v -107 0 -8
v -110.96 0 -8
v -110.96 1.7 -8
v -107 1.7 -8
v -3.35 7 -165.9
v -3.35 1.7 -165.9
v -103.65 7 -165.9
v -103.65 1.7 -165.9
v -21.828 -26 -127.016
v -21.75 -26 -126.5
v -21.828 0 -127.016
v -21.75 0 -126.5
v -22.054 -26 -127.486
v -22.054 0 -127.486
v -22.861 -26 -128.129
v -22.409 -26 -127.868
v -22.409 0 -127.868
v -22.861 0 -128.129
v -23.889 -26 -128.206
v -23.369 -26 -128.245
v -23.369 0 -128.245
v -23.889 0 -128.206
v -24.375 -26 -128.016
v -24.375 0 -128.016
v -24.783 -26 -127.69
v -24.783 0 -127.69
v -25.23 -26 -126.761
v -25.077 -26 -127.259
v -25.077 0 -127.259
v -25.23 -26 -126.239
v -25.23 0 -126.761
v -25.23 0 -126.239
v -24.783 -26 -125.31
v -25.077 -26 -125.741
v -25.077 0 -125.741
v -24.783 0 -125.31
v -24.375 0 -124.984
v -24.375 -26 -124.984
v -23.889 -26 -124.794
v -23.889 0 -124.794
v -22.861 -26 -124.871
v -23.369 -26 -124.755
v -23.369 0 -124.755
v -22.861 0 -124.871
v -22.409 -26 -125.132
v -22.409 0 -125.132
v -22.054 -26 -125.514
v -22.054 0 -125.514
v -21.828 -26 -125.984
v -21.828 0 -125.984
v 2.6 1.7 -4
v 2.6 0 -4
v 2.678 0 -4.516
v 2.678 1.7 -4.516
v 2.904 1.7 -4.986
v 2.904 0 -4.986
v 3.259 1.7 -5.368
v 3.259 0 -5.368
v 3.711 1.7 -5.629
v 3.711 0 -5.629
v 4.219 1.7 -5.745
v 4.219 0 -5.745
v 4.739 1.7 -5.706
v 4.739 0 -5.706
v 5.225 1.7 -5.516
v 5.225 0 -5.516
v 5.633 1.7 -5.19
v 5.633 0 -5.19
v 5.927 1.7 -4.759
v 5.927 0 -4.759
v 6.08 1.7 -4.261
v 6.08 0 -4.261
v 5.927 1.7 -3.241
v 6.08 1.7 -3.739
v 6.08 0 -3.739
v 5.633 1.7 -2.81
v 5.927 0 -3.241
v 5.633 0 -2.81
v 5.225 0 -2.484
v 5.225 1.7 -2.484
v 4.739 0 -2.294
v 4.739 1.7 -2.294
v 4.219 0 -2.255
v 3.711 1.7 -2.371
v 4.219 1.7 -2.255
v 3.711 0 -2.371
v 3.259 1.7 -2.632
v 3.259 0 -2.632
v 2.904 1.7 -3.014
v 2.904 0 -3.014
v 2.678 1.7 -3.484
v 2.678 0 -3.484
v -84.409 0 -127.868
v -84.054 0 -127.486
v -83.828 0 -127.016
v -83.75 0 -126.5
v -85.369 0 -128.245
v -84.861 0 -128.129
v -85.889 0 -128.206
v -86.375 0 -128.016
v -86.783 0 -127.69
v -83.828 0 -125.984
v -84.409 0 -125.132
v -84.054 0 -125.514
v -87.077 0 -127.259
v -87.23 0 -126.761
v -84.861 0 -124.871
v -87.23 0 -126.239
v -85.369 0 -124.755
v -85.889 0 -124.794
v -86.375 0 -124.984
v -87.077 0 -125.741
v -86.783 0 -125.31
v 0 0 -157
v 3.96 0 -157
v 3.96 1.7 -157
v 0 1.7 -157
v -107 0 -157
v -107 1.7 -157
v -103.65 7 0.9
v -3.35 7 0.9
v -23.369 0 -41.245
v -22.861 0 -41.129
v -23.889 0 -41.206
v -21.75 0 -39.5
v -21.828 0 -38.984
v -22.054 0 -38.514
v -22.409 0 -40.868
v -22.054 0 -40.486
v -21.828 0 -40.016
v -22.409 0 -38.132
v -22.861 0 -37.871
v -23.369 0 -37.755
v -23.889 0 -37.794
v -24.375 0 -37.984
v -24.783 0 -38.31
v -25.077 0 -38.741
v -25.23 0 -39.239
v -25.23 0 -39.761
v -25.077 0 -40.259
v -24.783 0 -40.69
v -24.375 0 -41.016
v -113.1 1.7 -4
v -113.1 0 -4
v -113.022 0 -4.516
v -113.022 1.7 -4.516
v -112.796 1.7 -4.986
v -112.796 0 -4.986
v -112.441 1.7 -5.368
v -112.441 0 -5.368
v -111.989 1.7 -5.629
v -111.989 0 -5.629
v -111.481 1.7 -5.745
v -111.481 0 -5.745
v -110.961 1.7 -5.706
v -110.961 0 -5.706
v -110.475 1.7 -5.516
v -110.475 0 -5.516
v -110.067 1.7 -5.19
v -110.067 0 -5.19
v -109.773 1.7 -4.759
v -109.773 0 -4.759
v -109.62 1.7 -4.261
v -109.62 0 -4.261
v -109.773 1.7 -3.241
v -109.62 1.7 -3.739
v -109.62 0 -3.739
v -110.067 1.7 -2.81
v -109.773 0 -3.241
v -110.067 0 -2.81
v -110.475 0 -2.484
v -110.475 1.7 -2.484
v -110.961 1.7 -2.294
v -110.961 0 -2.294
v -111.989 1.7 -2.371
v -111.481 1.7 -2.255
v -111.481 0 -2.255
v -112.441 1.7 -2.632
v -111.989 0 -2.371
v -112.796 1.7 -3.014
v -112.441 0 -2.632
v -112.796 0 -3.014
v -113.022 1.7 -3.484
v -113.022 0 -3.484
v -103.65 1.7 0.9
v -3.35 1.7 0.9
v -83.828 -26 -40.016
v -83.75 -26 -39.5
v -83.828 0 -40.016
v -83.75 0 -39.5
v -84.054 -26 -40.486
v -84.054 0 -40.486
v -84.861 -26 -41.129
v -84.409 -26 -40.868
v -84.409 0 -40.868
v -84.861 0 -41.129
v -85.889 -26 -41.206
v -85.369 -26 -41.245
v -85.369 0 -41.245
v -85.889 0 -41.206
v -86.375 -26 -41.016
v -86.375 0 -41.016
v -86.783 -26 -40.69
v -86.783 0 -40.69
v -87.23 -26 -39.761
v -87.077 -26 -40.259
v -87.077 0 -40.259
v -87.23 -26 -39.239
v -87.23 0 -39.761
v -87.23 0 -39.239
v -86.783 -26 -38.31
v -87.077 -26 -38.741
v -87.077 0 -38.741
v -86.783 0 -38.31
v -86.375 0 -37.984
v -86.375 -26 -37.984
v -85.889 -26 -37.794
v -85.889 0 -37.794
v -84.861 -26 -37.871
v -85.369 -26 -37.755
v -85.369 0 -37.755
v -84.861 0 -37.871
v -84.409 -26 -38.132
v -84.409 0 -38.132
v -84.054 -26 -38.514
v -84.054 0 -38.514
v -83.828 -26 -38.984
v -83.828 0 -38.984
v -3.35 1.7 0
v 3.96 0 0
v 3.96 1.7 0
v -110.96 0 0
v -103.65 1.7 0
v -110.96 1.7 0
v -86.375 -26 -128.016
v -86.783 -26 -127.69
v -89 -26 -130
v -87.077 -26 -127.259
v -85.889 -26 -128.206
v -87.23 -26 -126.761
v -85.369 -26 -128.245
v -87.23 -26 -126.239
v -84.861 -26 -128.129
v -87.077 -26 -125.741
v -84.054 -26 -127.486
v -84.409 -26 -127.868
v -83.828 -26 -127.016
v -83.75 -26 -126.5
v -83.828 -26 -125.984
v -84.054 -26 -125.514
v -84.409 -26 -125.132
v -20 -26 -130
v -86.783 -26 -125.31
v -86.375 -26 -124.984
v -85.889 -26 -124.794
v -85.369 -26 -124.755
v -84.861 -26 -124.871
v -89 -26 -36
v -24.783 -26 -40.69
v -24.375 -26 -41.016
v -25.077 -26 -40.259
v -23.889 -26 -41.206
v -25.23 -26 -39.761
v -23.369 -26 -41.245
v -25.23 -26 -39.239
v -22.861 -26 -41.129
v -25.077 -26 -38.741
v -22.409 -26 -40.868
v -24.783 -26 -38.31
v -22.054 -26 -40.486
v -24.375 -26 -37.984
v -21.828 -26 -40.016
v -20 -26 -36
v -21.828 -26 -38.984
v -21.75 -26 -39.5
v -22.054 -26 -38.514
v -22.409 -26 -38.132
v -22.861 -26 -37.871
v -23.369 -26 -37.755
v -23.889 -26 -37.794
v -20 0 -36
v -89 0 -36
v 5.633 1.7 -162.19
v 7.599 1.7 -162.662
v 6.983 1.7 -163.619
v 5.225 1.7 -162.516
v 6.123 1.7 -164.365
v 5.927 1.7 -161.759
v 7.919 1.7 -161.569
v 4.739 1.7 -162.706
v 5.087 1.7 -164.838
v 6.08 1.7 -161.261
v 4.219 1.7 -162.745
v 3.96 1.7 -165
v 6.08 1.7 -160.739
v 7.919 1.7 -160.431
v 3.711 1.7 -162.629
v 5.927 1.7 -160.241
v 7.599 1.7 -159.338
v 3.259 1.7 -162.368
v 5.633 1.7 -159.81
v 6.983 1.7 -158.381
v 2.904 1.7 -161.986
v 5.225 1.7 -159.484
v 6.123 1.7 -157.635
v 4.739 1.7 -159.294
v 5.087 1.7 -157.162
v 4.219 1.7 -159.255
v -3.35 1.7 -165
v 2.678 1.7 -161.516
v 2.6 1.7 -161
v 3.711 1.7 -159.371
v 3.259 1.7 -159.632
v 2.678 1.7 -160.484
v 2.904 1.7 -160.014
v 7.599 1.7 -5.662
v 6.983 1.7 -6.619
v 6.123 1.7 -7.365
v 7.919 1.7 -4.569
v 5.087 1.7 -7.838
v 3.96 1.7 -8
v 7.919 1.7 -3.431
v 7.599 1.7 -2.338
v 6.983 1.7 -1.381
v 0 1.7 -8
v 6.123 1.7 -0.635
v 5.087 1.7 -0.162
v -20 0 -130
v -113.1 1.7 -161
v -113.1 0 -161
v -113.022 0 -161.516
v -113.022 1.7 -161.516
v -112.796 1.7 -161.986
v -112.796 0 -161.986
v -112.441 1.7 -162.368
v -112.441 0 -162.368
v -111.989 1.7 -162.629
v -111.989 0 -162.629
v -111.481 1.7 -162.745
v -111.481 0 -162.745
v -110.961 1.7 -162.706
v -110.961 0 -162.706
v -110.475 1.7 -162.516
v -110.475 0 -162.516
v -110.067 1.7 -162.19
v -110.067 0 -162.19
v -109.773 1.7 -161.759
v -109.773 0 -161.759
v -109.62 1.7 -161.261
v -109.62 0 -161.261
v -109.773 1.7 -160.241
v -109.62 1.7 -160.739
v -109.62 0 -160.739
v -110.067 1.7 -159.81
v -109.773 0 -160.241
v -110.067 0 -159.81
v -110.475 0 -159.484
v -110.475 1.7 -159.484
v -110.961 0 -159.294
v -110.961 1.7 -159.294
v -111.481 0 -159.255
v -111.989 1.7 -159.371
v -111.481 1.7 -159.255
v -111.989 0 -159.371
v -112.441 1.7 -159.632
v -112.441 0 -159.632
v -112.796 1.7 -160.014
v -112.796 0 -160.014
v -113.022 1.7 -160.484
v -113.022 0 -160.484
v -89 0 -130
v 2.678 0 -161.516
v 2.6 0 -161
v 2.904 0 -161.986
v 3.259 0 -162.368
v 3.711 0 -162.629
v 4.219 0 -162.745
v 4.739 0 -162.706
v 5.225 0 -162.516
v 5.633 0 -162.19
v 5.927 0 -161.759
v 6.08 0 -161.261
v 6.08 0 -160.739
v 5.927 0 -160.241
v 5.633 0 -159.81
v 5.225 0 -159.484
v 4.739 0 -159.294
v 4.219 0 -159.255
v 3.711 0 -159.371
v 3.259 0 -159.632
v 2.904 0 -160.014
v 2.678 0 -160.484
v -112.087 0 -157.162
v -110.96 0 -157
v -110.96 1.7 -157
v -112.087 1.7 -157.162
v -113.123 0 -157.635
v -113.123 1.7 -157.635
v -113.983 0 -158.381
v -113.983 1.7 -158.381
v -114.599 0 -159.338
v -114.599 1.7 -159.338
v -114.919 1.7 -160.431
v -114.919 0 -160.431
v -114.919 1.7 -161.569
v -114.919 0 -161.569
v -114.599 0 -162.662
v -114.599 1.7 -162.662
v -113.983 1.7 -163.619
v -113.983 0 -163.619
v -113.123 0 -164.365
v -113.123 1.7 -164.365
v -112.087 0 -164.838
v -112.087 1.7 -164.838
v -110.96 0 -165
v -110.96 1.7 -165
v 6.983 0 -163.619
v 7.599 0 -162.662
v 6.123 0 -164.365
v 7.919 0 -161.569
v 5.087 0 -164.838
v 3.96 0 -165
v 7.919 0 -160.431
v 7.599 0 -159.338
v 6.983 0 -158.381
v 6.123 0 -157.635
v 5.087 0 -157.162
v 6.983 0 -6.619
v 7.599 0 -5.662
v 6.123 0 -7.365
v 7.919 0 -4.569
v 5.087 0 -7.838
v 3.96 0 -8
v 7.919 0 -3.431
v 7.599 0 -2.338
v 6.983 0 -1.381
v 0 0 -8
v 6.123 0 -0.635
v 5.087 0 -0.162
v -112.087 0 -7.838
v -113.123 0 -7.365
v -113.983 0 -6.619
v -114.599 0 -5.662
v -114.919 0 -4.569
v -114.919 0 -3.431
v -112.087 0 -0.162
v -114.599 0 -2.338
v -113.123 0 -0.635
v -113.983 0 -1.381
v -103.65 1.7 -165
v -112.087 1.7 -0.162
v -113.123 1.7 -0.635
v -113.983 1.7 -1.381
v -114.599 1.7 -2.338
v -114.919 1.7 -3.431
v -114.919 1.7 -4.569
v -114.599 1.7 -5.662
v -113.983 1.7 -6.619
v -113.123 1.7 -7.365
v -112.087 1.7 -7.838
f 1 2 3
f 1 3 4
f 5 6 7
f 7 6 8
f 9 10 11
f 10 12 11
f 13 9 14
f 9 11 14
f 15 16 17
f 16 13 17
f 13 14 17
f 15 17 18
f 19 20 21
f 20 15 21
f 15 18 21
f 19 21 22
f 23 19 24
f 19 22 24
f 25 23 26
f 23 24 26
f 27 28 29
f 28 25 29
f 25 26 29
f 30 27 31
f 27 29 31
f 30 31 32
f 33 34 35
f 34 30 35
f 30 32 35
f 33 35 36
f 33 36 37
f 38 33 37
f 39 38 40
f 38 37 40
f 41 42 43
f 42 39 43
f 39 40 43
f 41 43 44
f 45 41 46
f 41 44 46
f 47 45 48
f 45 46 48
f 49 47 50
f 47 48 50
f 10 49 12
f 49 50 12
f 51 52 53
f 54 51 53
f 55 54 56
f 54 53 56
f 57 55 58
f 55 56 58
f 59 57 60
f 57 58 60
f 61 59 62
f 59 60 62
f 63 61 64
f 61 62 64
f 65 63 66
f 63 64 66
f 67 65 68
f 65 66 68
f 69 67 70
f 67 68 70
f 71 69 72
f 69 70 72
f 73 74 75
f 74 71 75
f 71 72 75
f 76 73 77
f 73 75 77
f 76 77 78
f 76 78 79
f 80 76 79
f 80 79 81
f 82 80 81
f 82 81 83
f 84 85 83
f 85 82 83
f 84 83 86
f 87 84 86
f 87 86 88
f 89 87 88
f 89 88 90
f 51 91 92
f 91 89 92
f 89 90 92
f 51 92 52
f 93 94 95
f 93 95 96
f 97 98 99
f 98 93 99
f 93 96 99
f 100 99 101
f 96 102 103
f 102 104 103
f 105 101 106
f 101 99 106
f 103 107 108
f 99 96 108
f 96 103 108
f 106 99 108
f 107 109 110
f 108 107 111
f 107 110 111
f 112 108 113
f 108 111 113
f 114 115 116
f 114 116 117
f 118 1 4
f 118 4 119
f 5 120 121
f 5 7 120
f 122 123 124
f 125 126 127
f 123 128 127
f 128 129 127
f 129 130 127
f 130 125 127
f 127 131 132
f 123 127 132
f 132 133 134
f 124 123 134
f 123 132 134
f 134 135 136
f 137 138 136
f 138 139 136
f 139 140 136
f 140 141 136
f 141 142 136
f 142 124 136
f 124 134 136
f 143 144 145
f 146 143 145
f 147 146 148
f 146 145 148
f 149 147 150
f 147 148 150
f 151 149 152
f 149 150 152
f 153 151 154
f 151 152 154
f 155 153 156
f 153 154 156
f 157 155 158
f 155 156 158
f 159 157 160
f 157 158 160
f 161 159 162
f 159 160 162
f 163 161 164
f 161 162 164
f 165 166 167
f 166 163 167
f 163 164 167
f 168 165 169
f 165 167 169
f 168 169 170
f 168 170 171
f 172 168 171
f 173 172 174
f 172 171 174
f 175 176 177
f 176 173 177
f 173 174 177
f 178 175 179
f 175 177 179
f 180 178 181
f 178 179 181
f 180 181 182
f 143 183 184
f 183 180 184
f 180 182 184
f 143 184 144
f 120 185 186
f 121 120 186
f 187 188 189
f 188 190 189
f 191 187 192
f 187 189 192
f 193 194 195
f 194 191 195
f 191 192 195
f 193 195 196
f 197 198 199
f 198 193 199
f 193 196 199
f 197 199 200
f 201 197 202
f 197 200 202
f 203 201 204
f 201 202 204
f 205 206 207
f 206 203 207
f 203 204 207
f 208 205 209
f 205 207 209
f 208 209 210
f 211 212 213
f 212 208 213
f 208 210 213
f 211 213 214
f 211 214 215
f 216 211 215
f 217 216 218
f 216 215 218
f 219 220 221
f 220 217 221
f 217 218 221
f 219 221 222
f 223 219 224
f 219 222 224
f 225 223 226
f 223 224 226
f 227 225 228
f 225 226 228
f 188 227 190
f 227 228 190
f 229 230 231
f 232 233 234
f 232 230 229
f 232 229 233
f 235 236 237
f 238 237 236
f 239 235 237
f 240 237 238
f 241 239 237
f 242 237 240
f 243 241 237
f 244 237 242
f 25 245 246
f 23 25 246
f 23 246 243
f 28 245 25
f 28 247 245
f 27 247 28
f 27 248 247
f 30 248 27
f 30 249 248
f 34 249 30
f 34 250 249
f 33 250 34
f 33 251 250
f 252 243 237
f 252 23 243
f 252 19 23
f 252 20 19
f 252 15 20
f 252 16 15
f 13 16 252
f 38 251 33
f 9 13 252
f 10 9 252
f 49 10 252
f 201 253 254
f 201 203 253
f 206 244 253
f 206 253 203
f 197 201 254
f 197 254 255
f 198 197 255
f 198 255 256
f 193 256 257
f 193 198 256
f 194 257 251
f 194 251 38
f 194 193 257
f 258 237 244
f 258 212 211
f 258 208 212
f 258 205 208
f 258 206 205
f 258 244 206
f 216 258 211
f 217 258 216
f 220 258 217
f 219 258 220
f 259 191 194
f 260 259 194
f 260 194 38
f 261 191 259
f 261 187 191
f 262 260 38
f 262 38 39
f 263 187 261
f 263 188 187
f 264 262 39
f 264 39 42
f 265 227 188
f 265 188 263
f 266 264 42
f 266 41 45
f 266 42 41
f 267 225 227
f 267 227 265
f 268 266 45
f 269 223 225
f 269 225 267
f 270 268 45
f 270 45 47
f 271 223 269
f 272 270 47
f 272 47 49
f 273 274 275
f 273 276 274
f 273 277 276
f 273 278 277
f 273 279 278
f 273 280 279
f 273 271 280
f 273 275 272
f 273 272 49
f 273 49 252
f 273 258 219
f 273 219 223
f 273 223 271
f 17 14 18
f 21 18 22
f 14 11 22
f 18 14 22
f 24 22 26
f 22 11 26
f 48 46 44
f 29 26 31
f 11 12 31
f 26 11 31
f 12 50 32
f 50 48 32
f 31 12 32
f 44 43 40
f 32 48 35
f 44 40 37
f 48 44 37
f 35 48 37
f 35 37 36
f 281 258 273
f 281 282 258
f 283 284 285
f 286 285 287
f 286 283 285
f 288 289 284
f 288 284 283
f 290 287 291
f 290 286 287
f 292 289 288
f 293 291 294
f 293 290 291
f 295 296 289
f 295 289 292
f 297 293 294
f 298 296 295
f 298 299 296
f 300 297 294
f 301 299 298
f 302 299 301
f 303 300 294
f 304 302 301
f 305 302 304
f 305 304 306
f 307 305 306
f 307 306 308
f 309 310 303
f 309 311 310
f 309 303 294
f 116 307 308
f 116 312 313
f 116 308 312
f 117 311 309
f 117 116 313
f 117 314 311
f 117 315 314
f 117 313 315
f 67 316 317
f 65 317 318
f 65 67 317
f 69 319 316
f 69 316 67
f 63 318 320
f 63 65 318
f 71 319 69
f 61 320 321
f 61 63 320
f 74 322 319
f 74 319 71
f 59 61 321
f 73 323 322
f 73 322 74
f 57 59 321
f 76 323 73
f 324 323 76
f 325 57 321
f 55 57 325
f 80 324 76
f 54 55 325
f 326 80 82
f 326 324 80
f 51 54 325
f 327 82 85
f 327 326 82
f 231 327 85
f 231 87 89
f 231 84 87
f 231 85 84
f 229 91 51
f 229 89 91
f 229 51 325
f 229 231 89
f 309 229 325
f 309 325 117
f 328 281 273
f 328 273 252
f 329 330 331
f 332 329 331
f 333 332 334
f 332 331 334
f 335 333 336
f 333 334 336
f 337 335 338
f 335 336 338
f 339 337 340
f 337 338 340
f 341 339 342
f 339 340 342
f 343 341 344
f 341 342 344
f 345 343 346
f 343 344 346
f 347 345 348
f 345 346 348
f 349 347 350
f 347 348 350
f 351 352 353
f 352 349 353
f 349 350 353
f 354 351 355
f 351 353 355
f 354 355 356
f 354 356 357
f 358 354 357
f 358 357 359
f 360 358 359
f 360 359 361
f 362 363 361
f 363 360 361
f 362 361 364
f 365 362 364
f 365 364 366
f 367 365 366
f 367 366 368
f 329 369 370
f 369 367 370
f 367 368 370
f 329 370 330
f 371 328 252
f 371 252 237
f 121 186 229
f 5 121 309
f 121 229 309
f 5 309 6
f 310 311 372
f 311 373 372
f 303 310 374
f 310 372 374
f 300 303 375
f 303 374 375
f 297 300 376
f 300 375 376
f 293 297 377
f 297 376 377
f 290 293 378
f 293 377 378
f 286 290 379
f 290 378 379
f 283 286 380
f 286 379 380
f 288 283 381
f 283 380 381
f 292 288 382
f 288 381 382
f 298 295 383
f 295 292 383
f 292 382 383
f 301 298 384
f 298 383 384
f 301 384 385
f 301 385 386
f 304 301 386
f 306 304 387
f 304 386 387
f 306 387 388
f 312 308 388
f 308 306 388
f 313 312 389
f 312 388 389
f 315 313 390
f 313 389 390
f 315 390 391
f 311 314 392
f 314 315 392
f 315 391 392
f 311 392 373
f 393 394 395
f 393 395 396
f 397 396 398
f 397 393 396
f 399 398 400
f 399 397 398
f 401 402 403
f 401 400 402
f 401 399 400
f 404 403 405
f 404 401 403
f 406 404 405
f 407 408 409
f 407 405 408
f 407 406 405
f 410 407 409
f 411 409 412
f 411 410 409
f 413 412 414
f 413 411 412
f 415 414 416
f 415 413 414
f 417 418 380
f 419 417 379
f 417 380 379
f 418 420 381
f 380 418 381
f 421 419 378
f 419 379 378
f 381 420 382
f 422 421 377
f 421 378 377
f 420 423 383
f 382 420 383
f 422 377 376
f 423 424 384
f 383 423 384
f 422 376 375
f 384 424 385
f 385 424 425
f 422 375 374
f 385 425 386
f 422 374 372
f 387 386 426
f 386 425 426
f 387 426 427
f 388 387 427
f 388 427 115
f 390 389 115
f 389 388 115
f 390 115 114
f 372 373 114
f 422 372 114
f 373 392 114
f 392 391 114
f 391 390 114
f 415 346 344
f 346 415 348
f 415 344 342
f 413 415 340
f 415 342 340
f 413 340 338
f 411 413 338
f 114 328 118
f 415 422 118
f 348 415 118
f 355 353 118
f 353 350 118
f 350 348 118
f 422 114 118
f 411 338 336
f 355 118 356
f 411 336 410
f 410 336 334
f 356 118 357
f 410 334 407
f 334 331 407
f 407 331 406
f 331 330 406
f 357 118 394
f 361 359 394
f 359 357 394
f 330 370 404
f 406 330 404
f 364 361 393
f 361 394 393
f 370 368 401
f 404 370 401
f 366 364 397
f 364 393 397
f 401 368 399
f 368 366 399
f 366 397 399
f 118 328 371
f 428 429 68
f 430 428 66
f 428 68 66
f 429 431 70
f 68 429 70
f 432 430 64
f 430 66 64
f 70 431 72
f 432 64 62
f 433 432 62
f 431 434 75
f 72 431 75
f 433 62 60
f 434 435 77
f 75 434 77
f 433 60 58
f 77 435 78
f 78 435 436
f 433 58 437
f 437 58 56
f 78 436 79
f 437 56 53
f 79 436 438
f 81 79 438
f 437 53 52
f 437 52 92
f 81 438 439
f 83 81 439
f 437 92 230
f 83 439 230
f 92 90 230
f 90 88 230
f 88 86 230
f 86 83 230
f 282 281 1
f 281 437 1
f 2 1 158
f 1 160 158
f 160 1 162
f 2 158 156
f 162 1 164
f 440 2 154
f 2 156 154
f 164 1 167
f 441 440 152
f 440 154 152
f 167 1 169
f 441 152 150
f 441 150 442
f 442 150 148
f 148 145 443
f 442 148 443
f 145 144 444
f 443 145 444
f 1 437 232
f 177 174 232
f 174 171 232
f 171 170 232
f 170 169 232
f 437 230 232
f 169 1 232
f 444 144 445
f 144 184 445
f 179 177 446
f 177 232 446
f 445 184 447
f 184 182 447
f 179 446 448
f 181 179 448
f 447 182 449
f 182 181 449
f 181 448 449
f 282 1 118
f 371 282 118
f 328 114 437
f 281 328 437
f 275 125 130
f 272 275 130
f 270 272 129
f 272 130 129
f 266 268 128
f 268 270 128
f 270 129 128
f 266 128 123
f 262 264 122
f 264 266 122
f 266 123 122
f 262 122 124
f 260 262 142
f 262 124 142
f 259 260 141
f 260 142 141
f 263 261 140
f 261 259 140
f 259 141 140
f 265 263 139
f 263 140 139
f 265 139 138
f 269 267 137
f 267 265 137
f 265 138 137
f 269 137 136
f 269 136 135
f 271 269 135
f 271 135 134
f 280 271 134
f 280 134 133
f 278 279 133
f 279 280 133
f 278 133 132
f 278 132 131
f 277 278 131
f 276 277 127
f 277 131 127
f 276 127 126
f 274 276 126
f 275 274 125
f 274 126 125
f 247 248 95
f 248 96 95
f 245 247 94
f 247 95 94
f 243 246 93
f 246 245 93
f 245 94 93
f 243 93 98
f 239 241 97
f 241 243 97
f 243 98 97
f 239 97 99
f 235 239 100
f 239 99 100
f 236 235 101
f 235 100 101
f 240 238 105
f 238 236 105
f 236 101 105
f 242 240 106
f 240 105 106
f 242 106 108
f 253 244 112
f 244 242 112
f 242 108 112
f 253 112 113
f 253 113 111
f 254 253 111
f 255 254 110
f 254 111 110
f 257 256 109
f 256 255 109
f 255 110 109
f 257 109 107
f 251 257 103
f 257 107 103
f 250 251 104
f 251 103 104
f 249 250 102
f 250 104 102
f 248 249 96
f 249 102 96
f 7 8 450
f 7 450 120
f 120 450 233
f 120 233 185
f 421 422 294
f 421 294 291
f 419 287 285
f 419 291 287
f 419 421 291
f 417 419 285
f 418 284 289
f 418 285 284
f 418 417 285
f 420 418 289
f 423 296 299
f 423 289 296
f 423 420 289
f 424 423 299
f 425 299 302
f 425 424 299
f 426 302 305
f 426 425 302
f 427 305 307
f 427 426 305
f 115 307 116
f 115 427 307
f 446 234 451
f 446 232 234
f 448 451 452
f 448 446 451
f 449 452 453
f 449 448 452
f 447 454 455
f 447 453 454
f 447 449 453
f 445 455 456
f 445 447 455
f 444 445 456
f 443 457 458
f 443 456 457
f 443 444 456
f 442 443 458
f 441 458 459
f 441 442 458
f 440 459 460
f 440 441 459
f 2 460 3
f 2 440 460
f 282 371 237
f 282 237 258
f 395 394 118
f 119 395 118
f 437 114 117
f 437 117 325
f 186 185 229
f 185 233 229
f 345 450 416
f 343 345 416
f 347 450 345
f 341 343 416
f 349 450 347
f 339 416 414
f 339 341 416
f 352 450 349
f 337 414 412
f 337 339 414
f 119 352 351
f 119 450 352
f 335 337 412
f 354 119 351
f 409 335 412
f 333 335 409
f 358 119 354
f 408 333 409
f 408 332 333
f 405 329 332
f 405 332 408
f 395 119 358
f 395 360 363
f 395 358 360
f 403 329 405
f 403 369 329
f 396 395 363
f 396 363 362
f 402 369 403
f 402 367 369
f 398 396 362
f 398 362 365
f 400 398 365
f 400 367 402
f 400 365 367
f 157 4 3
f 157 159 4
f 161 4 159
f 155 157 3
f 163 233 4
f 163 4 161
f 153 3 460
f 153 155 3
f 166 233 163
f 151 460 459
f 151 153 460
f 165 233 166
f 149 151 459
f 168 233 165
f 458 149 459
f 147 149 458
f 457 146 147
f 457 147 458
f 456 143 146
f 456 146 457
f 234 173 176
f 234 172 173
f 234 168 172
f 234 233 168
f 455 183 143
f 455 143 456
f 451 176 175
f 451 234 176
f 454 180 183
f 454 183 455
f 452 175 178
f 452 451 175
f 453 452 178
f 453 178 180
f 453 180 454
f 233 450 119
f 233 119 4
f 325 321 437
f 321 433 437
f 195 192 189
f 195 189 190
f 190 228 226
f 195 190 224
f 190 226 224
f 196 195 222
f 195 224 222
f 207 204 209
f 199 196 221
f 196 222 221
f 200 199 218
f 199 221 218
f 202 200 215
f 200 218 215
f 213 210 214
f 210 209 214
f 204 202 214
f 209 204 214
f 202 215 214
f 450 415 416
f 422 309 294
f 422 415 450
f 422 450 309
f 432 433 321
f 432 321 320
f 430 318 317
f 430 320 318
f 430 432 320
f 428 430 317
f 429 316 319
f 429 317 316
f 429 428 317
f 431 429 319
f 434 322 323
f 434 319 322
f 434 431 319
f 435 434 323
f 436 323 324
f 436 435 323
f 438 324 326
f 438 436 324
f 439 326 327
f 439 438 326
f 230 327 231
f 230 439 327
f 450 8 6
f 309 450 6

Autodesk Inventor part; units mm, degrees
ref_plane "YZ Plane" through (0, 0, 0) normal (1, 0, 0) x (0, 1, 0)
ref_plane "XZ Plane" through (0, 0, 0) normal (0, 1, 0) x (-1, 0, 0)
ref_plane "XY Plane" through (0, 0, 0) normal (0, 0, 1) x (1, 0, 0)
sketch "スケッチ1" plane through (0, 0, 0) normal (0, 1, 0) x (-1, 0, 0)
  line L0 (0, 0) -> (107, 0)
  line L1 (107, 0) -> (107, -165)
  line L2 (107, -165) -> (0, -165)
  line L3 (0, -165) -> (0, 0)
  line L4 (107, 0) -> (114.96, 0)
  line L5 (114.96, 0) -> (114.96, -8)
  line L6 (114.96, -8) -> (107, -8)
  line L7 (107, -8) -> (107, 0)
  line L8 (53.5, 0) -> (53.5, -165)
  circle A0 centre (111.35, -4) radius 1.75
  line L9 (107, -82.5) -> (0, -82.5)
  circle A1 centre (110.96, -4) radius 4
  line L10 (107, -165) -> (114.96, -165)
  line L11 (114.96, -157) -> (107, -157)
  circle A2 centre (111.35, -161) radius 1.75
  circle A3 centre (110.96, -161) radius 4
  line L12 (0, 0) -> (-7.96, 0)
  line L13 (-7.96, -8) -> (0, -8)
  circle A4 centre (-4.35, -4) radius 1.75
  circle A5 centre (-3.96, -4) radius 4
  circle A6 centre (-3.96, -161) radius 4
  circle A7 centre (-4.35, -161) radius 1.75
  line L14 (-7.96, -157) -> (0, -157)
  line L15 (0, -165) -> (-7.96, -165)
  point P0 (109.6, -4)
  point P1 (110.96, -8)
  point P2 (110.96, 0)
  point P3 (-3.96, 0)
  point P4 (-3.96, -8)
  point P5 (-3.96, -157)
  point P6 (-3.96, -165)
  point P7 (110.96, -165)
  point P8 (110.96, -157)
  point P9 (0, -4.5643)
  point P10 (0, -3.4357)
  point P11 (107, -4.5643)
  point P12 (107, -3.4357)
  dimension "d6" = 3.5
  dimension "d0" = 107
  dimension "d1" = 165
  dimension "d2" = 8
  dimension "d3" = 7.96
  dimension "d5" = 56.1
  dimension "d7" = 8
extrude "押し出し1" add sketch "スケッチ1" along normal blind 1.7 contours L0 L8 L9 L3 A5 | L3 A5 L12 | L0 L1 A1 L9 L8 | A5 L3 | L3 A5 | L4 A1 L1 | L9 L1 A3 L2 L8 | L8 L2 L3 A6 L9 | L3 L13 A5 | A1 L1 | L1 A1 | A1 L6 L1 | L1 A3 L10 | L15 A6 L3 | L11 A3 L1 | L3 A6 L14 | A3 L1 | L1 A3 | A6 L3 | L3 A6
sketch "スケッチ2" plane through (0, 1.7, 0) normal (0, 1, 0) x (1, 0, 0)
  arc A0 (-110.96, 8) -> (-110.96, 0) centre (-110.96, 4) ccw projected
  line L0 (-110.96, 0) -> (3.96, 0) projected
  arc A1 (3.96, 0) -> (3.96, 8) centre (3.96, 4) ccw projected
  line L1 (3.96, 8) -> (0, 8) projected
  line L2 (0, 8) -> (0, 157) projected
  line L3 (0, 157) -> (3.96, 157) projected
  arc A2 (3.96, 157) -> (3.96, 165) centre (3.96, 161) ccw projected
  line L4 (3.96, 165) -> (-110.96, 165) projected
  arc A3 (-110.96, 165) -> (-110.96, 157) centre (-110.96, 161) ccw projected
  line L5 (-110.96, 157) -> (-107, 157) projected
  line L6 (-107, 157) -> (-107, 8) projected
  line L7 (-107, 8) -> (-110.96, 8) projected
  circle A4 centre (4.35, 161) radius 1.75 projected
  circle A5 centre (4.35, 4) radius 1.75 projected
  circle A6 centre (-111.35, 161) radius 1.75 projected
  circle A7 centre (-111.35, 4) radius 1.75 projected
  line L8 (-103.65, -0.9) -> (-3.35, -0.9)
  line L9 (-3.35, -0.9) -> (-3.35, 165.9)
  line L10 (-3.35, 165.9) -> (-103.65, 165.9)
  line L11 (-103.65, 165.9) -> (-103.65, -0.9)
  line L12 (-103.65, -0.9) -> (-3.35, 165.9) construction
  line L13 (-3.35, -0.9) -> (-103.65, 165.9) construction
  point P0 (0, 0)
  point P1 (-53.5, 82.5)
  dimension "d10" = 100.3
  dimension "d11" = 53.5
  dimension "d12" = 82.5
  dimension "d13" = 166.8
extrude "押し出し2" add sketch "スケッチ2" along normal blind 5.3 contours L11 L4 L9 L0 | L0 L9 L8 L11 | L11 L10 L9 L4
sketch "スケッチ3" plane through (0, 0, 0) normal (0, -1, 0) x (1, 0, 0)
  arc A0 (-110.96, 0) -> (-110.96, -8) centre (-110.96, -4) ccw projected
  line L0 (-107, -8) -> (-110.96, -8) projected
  line L1 (-107, -157) -> (-107, -8) projected
  line L2 (-110.96, -157) -> (-107, -157) projected
  arc A1 (-110.96, -157) -> (-110.96, -165) centre (-110.96, -161) ccw projected
  line L3 (3.96, -165) -> (-110.96, -165) projected
  arc A2 (3.96, -165) -> (3.96, -157) centre (3.96, -161) ccw projected
  line L4 (0, -157) -> (3.96, -157) projected
  line L5 (0, -8) -> (0, -157) projected
  line L6 (3.96, -8) -> (0, -8) projected
  arc A3 (3.96, -8) -> (3.96, 0) centre (3.96, -4) ccw projected
  line L7 (-110.96, 0) -> (3.96, 0) projected
  circle A4 centre (4.35, -161) radius 1.75 projected
  circle A5 centre (4.35, -4) radius 1.75 projected
  circle A6 centre (-111.35, -161) radius 1.75 projected
  circle A7 centre (-111.35, -4) radius 1.75 projected
  line L8 (-89, -36) -> (-20, -36)
  line L9 (-20, -36) -> (-20, -130)
  line L10 (-20, -130) -> (-89, -130)
  line L11 (-89, -130) -> (-89, -36)
  circle A8 centre (-23.5, -39.5) radius 1.75
  line L12 (-20, -83) -> (-89, -83)
  line L13 (-54.5, -130) -> (-54.5, -36)
  circle A9 centre (-23.5, -126.5) radius 1.75
  circle A10 centre (-85.5, -39.5) radius 1.75
  circle A11 centre (-85.5, -126.5) radius 1.75
  point P0 (0, 0)
  point P1 (-54.5, -83)
  dimension "d16" = 94
  dimension "d17" = 69
  dimension "d18" = 36
  dimension "d19" = 20
  dimension "d22" = 34.5
  dimension "d23" = 47
  dimension "d24" = 3.5
  dimension "d25" = 3.5
  dimension "d26" = 3.5
extrude "押し出し3" add sketch "スケッチ3" along normal blind 26 contours L8 L13 L12 L11 | L8 L9 L12 L13 | L12 L13 L10 L11 | L12 L9 L10 L13
ref_plane "作業平面1" through (-53.5, 1.7, 0) normal (1, 0, 0) x (0, 0, -1)
properties part number "Display_EVICIV7Inch"
